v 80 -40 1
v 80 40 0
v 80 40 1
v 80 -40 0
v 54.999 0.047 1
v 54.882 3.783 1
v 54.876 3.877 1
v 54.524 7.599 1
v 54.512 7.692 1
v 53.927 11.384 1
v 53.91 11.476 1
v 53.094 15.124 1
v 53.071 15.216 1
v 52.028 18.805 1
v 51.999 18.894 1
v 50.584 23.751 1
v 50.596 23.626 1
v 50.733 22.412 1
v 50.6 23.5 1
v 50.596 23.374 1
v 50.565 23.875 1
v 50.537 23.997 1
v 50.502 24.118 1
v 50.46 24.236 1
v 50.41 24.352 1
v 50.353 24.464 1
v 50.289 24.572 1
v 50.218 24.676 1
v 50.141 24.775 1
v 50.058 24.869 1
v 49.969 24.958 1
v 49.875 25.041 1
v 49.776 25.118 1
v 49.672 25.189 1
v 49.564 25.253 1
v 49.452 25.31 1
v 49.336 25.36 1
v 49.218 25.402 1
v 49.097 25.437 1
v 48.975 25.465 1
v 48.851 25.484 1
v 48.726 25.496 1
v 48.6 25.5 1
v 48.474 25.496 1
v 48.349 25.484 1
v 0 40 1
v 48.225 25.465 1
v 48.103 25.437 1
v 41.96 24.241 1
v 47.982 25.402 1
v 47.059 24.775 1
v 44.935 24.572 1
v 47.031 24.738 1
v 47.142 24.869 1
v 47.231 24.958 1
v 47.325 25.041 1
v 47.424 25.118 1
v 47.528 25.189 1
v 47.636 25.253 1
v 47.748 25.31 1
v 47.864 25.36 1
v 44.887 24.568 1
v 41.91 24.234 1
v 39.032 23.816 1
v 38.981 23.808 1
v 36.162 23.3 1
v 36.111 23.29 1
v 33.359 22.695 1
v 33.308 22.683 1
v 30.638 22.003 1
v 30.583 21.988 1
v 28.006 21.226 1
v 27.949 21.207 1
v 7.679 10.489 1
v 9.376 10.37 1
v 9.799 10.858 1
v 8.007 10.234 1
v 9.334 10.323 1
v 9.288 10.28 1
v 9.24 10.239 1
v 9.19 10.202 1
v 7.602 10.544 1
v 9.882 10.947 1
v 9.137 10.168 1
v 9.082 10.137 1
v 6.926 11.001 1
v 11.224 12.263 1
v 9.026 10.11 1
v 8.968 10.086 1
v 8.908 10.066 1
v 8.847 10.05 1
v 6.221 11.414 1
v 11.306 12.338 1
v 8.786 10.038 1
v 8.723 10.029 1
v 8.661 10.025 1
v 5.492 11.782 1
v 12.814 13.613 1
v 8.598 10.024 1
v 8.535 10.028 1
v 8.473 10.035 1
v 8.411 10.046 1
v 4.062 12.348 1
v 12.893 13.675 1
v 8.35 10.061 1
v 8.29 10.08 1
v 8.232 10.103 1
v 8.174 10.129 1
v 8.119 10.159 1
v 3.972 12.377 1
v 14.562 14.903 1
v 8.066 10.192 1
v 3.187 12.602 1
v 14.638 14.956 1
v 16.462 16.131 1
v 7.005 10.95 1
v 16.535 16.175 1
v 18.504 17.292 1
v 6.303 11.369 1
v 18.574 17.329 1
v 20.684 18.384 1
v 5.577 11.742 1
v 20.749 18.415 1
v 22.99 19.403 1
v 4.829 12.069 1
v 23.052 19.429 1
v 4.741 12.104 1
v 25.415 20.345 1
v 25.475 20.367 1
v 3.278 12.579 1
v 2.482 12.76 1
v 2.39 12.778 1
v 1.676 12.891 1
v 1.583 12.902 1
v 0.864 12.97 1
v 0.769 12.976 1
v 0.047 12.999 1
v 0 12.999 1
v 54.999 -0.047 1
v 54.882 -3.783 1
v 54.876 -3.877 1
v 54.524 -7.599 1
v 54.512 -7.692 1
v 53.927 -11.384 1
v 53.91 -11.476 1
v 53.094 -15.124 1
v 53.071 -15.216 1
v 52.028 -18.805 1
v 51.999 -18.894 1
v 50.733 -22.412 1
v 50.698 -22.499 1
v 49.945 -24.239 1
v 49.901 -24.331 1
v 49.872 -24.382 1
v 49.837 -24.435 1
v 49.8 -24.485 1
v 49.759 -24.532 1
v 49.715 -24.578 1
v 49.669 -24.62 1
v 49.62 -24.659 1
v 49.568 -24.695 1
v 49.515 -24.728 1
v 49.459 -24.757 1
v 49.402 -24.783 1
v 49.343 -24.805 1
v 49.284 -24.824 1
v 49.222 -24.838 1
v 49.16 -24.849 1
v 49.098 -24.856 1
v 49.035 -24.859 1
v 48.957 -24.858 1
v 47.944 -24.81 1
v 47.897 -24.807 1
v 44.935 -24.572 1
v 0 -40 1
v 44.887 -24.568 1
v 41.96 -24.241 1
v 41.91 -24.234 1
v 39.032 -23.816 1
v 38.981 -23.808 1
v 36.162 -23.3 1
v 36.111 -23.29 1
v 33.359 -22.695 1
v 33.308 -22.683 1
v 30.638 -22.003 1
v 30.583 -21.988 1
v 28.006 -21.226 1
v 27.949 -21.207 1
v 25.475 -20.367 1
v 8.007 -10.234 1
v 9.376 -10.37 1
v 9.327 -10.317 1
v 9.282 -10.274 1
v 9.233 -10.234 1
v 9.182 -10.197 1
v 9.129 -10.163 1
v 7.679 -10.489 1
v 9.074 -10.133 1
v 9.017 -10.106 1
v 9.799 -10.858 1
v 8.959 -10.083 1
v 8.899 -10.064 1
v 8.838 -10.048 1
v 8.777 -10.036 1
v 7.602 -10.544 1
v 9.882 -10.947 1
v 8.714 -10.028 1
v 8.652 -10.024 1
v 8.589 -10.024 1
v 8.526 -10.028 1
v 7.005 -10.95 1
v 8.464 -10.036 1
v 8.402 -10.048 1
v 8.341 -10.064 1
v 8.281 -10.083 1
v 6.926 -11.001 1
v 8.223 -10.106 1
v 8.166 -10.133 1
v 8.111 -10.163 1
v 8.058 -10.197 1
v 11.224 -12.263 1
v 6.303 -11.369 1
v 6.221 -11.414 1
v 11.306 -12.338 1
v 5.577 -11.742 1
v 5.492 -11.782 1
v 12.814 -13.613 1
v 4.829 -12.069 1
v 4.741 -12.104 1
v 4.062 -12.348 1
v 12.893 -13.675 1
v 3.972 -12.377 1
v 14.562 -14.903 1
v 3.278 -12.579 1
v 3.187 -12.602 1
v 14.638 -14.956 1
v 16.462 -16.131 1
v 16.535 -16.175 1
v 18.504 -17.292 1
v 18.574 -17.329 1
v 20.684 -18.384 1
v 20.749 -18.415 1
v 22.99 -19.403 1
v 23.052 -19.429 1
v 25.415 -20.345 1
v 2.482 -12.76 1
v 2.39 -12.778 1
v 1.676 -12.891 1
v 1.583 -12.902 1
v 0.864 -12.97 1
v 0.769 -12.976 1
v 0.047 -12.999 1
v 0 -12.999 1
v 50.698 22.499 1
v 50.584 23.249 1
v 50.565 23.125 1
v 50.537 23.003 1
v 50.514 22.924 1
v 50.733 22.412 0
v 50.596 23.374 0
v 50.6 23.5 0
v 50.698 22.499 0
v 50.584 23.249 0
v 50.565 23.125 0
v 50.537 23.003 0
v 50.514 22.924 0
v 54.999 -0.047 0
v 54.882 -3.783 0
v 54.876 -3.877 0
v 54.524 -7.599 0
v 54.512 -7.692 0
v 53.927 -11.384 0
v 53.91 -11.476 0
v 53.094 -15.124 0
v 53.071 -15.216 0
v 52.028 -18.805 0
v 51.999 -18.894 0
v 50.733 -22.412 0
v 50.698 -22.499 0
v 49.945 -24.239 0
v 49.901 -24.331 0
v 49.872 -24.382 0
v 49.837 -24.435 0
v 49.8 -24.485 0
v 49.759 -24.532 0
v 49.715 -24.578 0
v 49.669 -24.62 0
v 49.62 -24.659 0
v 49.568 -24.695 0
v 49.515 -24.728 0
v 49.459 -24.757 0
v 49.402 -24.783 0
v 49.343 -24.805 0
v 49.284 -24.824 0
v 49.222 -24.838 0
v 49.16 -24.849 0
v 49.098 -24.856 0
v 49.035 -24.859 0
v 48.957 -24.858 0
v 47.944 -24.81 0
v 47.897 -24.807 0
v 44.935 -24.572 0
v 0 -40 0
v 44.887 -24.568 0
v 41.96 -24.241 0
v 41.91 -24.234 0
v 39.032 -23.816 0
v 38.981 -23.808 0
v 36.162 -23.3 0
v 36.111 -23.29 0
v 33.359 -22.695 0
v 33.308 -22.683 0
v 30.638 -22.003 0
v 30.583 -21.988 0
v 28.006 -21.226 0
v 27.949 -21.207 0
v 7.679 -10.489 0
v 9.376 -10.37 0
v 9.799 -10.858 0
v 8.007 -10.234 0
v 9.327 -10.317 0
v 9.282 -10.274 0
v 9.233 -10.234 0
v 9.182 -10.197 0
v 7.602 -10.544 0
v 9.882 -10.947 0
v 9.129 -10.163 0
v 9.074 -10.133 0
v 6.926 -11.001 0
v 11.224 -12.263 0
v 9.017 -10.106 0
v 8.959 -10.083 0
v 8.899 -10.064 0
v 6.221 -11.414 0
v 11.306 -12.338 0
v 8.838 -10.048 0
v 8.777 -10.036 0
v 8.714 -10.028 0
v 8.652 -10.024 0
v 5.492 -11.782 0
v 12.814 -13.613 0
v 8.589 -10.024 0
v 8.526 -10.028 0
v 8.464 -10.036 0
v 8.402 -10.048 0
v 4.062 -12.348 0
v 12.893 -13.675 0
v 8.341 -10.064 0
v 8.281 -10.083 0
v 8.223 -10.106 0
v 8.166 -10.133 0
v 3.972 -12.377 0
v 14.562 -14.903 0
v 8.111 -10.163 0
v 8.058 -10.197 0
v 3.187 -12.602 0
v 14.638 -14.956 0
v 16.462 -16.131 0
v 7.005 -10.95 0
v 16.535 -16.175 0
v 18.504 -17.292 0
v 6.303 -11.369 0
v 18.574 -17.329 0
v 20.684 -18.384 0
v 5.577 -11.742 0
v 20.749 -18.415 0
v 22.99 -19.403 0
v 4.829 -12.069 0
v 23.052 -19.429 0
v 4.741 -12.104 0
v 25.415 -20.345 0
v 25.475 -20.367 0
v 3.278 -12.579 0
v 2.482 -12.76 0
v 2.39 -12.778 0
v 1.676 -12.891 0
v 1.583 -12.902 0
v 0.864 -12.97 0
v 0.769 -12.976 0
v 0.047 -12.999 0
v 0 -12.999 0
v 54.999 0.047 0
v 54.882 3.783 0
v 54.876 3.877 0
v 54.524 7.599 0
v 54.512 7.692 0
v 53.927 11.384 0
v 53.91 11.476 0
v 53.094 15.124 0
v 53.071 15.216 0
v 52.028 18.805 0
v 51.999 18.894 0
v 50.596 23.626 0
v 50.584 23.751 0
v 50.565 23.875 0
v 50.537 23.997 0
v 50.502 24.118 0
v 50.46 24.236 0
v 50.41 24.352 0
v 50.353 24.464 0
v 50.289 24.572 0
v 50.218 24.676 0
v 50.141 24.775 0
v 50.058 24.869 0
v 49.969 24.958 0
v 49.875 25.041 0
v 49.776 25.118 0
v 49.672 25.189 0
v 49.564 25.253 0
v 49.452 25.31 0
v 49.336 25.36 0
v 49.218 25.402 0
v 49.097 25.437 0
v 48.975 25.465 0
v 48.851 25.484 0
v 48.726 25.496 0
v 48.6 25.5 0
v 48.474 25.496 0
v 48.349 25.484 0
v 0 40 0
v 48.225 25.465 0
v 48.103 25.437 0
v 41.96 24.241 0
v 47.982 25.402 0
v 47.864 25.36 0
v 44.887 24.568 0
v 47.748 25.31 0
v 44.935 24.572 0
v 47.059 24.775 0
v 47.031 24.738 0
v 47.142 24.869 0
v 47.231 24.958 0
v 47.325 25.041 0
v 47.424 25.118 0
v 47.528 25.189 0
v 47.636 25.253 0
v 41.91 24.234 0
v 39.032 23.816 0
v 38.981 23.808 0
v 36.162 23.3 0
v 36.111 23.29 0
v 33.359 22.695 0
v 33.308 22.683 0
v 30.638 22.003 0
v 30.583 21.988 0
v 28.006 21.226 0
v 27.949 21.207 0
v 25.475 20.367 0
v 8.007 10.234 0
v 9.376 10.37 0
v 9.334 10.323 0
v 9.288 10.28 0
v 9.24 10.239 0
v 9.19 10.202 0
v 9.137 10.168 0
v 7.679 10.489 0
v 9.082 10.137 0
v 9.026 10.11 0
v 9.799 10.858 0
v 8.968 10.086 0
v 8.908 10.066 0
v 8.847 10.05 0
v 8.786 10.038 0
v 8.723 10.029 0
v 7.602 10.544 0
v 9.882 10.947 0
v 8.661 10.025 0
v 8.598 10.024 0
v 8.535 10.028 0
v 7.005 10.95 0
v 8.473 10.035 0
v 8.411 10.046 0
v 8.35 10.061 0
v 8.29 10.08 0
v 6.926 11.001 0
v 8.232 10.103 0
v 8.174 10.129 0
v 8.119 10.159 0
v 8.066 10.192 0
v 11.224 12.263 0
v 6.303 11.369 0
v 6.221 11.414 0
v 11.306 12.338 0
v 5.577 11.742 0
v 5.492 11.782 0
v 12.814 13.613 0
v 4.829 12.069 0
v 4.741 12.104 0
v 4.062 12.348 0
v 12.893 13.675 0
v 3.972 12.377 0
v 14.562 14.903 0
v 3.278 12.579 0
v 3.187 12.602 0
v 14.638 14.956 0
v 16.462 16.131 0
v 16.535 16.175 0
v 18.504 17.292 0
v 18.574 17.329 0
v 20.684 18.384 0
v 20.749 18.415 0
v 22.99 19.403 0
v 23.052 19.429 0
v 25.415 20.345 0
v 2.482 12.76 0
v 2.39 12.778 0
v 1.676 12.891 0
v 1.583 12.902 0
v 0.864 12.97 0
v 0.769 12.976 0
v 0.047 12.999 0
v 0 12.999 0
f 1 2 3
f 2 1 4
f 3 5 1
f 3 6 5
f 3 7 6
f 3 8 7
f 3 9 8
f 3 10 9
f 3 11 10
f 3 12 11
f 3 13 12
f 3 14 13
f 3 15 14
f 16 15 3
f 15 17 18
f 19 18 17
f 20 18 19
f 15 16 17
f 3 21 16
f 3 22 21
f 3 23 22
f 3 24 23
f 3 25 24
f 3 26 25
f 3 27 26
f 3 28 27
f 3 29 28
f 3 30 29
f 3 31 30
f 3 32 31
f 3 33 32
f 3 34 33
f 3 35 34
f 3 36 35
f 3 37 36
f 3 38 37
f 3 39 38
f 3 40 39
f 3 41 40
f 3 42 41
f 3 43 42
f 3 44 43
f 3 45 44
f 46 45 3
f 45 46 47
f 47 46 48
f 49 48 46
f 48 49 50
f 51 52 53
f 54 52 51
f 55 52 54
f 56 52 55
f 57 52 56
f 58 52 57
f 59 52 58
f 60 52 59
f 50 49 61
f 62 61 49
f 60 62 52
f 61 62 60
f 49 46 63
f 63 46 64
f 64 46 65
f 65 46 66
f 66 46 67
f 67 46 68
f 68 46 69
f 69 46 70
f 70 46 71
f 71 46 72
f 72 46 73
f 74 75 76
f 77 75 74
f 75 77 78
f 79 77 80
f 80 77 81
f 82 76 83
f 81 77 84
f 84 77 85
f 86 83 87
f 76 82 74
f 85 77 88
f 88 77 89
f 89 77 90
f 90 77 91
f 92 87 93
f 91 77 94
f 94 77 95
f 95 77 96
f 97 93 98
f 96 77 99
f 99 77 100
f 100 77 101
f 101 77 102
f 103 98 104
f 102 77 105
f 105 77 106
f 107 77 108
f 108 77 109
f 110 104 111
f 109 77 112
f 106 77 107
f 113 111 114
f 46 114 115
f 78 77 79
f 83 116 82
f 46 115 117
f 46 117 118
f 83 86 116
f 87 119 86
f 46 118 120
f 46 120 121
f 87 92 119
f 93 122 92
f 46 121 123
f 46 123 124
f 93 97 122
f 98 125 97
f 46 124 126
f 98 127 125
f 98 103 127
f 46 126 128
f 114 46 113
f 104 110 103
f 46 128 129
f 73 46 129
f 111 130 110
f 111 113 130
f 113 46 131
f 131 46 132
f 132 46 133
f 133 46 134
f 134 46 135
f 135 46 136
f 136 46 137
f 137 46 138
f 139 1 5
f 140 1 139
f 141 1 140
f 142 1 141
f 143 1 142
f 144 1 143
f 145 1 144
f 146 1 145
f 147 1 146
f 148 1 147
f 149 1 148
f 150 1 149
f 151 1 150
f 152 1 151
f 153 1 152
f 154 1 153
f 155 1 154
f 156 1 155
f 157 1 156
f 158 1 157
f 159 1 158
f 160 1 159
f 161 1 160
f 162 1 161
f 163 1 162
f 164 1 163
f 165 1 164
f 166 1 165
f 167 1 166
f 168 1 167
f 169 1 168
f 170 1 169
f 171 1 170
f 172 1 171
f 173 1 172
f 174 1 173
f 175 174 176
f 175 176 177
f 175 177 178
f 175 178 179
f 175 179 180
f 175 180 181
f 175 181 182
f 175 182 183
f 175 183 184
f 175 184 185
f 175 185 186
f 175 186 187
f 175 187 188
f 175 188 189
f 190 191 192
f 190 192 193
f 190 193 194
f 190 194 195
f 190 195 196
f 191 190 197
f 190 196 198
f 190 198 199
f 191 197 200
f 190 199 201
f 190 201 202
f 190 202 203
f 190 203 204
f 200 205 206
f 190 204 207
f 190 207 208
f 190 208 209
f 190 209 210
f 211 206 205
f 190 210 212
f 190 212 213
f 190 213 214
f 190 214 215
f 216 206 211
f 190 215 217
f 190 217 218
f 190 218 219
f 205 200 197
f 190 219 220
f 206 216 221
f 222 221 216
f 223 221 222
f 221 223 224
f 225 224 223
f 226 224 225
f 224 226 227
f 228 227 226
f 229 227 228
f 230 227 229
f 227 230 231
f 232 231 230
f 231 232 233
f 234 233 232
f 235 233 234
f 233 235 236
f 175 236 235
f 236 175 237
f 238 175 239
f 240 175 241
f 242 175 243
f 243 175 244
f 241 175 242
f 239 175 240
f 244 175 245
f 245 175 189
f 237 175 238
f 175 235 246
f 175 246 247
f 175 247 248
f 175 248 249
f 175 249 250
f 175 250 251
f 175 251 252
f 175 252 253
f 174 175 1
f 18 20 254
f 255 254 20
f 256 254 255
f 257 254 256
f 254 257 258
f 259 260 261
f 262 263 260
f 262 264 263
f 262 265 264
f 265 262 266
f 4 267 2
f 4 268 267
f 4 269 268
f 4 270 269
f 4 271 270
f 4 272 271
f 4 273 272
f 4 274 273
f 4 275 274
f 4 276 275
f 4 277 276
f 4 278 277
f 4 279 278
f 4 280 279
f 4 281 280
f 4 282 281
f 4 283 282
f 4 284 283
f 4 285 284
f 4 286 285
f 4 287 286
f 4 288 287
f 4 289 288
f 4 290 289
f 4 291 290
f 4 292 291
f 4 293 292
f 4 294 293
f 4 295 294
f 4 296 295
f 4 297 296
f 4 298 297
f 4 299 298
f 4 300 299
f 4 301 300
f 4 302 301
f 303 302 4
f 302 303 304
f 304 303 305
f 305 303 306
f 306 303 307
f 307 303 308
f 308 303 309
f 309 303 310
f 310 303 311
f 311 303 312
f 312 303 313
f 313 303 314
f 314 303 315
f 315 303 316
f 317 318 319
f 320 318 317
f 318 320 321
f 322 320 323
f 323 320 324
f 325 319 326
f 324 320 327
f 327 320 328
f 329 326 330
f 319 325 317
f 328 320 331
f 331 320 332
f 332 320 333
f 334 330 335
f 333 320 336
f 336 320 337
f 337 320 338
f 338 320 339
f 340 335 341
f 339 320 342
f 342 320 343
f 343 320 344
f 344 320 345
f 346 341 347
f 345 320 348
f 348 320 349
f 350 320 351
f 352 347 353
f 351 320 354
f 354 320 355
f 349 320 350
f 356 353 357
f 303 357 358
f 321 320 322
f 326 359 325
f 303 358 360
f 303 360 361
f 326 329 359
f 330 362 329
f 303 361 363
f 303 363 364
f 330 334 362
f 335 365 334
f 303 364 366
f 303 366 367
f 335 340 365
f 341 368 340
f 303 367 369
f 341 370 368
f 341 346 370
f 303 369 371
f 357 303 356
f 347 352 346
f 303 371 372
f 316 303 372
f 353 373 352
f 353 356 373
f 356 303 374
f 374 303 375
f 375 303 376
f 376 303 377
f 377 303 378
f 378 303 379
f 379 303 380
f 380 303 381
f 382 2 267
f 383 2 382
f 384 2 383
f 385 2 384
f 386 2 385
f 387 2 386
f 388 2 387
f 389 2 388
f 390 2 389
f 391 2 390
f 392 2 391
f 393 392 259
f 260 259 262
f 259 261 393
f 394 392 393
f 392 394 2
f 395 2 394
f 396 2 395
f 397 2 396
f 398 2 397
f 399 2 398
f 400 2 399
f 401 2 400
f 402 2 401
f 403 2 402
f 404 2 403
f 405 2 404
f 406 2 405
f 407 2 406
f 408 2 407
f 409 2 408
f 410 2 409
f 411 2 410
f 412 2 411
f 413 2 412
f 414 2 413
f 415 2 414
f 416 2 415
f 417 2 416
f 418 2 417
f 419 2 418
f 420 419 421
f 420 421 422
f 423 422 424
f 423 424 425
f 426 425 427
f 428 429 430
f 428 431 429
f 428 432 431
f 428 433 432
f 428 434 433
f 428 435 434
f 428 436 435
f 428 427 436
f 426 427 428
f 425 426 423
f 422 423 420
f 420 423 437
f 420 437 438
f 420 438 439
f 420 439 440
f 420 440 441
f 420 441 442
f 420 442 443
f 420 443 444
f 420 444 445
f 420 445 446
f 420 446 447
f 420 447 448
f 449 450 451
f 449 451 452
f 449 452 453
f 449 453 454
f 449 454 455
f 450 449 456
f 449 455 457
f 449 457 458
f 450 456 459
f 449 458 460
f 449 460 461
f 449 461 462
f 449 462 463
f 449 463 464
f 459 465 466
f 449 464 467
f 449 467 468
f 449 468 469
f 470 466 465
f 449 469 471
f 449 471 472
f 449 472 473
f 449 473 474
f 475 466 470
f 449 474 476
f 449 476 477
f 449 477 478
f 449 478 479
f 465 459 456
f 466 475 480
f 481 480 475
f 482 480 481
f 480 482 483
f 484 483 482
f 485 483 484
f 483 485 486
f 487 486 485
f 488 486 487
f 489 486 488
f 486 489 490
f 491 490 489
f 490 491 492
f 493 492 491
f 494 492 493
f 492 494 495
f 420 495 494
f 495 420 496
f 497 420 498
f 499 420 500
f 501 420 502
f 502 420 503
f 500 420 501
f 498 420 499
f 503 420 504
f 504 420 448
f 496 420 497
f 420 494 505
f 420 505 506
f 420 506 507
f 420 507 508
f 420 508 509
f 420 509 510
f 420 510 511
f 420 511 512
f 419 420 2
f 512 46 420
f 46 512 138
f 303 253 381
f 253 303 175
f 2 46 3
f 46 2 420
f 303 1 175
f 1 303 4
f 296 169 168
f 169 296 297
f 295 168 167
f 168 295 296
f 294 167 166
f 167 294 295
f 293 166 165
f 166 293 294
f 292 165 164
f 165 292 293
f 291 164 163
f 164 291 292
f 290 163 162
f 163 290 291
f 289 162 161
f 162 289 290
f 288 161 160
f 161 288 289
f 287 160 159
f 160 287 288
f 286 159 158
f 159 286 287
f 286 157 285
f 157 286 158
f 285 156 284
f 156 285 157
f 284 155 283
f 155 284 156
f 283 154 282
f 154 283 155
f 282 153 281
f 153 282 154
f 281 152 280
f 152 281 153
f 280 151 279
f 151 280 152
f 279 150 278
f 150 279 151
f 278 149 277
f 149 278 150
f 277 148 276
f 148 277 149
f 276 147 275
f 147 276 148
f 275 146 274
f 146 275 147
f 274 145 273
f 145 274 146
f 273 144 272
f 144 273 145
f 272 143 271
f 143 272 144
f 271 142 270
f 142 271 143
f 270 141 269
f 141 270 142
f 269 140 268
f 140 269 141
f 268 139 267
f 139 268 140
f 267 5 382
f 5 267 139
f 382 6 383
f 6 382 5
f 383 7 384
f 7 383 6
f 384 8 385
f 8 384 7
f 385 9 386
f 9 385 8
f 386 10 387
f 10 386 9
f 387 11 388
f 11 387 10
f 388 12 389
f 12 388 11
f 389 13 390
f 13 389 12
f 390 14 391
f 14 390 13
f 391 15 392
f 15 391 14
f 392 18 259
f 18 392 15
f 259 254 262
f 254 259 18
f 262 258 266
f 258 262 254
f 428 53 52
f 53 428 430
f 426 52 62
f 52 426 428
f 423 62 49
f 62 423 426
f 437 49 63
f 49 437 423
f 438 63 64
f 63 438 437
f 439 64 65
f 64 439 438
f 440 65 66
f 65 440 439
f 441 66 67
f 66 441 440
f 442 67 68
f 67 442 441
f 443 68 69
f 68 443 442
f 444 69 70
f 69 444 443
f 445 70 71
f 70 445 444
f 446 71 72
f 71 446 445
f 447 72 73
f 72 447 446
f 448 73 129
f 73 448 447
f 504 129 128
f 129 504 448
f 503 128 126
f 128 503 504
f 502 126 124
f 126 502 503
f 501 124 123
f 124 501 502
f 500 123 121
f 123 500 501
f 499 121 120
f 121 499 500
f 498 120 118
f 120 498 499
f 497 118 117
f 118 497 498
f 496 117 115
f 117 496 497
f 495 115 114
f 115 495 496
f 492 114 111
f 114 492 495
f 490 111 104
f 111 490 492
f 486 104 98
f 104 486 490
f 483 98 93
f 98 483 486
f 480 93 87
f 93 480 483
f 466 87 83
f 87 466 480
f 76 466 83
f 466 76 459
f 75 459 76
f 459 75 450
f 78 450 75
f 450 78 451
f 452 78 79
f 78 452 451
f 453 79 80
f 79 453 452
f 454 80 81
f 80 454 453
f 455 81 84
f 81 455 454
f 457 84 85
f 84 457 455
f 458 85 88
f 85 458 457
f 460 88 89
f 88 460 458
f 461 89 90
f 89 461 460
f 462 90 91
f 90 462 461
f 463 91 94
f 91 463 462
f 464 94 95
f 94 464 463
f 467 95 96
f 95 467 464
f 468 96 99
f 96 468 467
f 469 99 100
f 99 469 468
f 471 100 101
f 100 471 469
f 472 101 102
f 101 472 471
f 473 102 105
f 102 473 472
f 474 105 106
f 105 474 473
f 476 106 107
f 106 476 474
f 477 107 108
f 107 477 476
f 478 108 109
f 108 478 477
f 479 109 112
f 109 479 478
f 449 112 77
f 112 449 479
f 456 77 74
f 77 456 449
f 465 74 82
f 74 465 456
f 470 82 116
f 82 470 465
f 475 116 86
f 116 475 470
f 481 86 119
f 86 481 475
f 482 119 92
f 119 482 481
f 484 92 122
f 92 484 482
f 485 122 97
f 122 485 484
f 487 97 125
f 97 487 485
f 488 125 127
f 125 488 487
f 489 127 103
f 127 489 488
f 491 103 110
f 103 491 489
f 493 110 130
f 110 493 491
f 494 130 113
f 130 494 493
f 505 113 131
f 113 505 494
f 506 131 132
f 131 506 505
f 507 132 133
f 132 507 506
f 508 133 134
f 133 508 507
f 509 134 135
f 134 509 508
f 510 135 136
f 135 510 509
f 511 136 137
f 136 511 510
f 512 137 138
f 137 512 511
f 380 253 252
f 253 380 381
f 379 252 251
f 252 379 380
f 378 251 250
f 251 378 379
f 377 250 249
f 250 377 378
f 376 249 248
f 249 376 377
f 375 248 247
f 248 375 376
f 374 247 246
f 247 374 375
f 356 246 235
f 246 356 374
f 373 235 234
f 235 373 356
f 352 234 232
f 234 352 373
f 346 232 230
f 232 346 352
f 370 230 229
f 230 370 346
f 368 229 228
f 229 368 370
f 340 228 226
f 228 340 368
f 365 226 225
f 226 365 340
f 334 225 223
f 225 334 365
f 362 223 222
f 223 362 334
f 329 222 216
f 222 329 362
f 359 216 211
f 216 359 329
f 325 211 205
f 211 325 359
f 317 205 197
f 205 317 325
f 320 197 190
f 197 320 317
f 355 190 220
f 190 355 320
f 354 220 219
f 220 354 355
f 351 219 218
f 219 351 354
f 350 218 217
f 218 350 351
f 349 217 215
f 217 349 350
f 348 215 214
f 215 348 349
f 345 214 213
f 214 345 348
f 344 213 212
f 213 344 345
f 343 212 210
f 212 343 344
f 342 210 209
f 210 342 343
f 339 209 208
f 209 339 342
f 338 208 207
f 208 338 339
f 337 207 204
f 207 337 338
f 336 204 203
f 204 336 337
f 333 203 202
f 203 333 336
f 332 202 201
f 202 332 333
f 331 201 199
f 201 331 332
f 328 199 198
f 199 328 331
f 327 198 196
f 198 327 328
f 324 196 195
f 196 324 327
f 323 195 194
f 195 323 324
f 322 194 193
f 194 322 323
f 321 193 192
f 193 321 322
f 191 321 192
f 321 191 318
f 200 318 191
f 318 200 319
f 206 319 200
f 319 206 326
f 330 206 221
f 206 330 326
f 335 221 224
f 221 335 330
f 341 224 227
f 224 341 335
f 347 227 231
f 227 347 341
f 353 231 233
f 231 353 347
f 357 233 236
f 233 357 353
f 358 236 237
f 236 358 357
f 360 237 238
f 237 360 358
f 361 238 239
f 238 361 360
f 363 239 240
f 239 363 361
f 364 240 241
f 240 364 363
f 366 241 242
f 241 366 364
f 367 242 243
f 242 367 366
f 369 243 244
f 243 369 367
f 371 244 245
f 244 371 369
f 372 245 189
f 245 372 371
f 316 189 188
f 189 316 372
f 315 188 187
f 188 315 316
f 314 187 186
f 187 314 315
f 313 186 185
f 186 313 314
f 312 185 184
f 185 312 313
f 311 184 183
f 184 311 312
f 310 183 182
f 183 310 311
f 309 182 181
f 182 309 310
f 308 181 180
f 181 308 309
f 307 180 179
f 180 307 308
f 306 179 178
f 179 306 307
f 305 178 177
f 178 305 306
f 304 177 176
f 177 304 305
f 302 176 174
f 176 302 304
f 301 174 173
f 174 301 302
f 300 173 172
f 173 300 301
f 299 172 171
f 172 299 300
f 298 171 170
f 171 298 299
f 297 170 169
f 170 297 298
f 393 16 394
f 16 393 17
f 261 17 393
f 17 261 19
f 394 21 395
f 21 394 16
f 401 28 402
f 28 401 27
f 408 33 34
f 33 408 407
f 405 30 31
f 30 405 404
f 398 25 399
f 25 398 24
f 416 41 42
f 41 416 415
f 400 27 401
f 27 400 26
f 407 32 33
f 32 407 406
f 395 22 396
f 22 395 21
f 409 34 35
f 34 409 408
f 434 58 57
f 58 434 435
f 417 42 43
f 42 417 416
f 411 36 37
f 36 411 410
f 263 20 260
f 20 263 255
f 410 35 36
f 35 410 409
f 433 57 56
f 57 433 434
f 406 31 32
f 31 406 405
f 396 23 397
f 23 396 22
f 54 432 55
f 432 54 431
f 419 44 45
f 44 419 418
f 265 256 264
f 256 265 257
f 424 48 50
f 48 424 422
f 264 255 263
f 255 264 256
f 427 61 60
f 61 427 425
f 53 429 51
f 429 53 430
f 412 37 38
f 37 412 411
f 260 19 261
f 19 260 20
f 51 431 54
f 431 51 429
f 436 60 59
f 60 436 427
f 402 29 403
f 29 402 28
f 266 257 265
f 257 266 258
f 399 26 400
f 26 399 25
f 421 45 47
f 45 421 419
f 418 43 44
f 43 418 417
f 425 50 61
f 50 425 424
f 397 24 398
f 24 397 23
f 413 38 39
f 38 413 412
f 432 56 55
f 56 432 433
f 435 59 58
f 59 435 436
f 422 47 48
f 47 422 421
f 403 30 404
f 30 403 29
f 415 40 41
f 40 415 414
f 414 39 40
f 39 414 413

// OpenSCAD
$fn=100;

// 2.8 x 3.2 x 1.8


// BowTie with LEDholes
/*
difference() {
    offset(r=-1) offset(r=2) bowtie(1.2);
    led_cutouts();
    mirror([1,0]) led_cutouts();
}
*/
// BowTie outline

difference() {
    translate([40,00,0.5]) cube([80,80,1],center=true);
    #linear_extrude(2) offset(r=-1) offset(r=2) bowtie(1.2);
    #translate([48.6,23.5,0])cylinder(r=2,h=10);
}






module bowtie(s=1) scale(s) {
    circle(r=10);
    translate([45,0]) intersection() {
        scale([2,1]) circle(r=20);
        translate([-50,0]) circle(r=50);
    }
    mirror([1,0])translate([45,0]) intersection() {
        scale([2,1]) circle(r=20);
        translate([-50,0]) circle(r=50);
    }    
}

module led_cutout() {
    square([3.6,3.0],center=true);
}

module led_cutouts() {
    led_cutout();
    for(i=[-20,0,20]) rotate(i) translate([45,0]) led_cutout();
    for(i=[-20,0,20]) rotate(i) translate([33,0]) led_cutout();
    for(i=[-20,20]) rotate(i) translate([21,0]) led_cutout();
}

module bowtie_outline(s=1) {
    difference() {
        offset(r=-1) offset(r=4) bowtie(s);
        difference() {
            bowtie(s);
            offset(r=3) circle(r=10*s);
        }
        offset(r=3) circle(r=7.5*s);
    }
}

module bowtie_outlineX(s=1) union() {
    difference() {
        offset(r=-1) offset(r=4) bowtie(s);
        offset(r=0) bowtie(s);
        //offset(r=-0.8) offset(r=2) bowtie(1.2);
    }
    difference() {
        offset(r=3) circle(r=10*s);
        offset(r=3) circle(r=7.5*s);
    }
}
